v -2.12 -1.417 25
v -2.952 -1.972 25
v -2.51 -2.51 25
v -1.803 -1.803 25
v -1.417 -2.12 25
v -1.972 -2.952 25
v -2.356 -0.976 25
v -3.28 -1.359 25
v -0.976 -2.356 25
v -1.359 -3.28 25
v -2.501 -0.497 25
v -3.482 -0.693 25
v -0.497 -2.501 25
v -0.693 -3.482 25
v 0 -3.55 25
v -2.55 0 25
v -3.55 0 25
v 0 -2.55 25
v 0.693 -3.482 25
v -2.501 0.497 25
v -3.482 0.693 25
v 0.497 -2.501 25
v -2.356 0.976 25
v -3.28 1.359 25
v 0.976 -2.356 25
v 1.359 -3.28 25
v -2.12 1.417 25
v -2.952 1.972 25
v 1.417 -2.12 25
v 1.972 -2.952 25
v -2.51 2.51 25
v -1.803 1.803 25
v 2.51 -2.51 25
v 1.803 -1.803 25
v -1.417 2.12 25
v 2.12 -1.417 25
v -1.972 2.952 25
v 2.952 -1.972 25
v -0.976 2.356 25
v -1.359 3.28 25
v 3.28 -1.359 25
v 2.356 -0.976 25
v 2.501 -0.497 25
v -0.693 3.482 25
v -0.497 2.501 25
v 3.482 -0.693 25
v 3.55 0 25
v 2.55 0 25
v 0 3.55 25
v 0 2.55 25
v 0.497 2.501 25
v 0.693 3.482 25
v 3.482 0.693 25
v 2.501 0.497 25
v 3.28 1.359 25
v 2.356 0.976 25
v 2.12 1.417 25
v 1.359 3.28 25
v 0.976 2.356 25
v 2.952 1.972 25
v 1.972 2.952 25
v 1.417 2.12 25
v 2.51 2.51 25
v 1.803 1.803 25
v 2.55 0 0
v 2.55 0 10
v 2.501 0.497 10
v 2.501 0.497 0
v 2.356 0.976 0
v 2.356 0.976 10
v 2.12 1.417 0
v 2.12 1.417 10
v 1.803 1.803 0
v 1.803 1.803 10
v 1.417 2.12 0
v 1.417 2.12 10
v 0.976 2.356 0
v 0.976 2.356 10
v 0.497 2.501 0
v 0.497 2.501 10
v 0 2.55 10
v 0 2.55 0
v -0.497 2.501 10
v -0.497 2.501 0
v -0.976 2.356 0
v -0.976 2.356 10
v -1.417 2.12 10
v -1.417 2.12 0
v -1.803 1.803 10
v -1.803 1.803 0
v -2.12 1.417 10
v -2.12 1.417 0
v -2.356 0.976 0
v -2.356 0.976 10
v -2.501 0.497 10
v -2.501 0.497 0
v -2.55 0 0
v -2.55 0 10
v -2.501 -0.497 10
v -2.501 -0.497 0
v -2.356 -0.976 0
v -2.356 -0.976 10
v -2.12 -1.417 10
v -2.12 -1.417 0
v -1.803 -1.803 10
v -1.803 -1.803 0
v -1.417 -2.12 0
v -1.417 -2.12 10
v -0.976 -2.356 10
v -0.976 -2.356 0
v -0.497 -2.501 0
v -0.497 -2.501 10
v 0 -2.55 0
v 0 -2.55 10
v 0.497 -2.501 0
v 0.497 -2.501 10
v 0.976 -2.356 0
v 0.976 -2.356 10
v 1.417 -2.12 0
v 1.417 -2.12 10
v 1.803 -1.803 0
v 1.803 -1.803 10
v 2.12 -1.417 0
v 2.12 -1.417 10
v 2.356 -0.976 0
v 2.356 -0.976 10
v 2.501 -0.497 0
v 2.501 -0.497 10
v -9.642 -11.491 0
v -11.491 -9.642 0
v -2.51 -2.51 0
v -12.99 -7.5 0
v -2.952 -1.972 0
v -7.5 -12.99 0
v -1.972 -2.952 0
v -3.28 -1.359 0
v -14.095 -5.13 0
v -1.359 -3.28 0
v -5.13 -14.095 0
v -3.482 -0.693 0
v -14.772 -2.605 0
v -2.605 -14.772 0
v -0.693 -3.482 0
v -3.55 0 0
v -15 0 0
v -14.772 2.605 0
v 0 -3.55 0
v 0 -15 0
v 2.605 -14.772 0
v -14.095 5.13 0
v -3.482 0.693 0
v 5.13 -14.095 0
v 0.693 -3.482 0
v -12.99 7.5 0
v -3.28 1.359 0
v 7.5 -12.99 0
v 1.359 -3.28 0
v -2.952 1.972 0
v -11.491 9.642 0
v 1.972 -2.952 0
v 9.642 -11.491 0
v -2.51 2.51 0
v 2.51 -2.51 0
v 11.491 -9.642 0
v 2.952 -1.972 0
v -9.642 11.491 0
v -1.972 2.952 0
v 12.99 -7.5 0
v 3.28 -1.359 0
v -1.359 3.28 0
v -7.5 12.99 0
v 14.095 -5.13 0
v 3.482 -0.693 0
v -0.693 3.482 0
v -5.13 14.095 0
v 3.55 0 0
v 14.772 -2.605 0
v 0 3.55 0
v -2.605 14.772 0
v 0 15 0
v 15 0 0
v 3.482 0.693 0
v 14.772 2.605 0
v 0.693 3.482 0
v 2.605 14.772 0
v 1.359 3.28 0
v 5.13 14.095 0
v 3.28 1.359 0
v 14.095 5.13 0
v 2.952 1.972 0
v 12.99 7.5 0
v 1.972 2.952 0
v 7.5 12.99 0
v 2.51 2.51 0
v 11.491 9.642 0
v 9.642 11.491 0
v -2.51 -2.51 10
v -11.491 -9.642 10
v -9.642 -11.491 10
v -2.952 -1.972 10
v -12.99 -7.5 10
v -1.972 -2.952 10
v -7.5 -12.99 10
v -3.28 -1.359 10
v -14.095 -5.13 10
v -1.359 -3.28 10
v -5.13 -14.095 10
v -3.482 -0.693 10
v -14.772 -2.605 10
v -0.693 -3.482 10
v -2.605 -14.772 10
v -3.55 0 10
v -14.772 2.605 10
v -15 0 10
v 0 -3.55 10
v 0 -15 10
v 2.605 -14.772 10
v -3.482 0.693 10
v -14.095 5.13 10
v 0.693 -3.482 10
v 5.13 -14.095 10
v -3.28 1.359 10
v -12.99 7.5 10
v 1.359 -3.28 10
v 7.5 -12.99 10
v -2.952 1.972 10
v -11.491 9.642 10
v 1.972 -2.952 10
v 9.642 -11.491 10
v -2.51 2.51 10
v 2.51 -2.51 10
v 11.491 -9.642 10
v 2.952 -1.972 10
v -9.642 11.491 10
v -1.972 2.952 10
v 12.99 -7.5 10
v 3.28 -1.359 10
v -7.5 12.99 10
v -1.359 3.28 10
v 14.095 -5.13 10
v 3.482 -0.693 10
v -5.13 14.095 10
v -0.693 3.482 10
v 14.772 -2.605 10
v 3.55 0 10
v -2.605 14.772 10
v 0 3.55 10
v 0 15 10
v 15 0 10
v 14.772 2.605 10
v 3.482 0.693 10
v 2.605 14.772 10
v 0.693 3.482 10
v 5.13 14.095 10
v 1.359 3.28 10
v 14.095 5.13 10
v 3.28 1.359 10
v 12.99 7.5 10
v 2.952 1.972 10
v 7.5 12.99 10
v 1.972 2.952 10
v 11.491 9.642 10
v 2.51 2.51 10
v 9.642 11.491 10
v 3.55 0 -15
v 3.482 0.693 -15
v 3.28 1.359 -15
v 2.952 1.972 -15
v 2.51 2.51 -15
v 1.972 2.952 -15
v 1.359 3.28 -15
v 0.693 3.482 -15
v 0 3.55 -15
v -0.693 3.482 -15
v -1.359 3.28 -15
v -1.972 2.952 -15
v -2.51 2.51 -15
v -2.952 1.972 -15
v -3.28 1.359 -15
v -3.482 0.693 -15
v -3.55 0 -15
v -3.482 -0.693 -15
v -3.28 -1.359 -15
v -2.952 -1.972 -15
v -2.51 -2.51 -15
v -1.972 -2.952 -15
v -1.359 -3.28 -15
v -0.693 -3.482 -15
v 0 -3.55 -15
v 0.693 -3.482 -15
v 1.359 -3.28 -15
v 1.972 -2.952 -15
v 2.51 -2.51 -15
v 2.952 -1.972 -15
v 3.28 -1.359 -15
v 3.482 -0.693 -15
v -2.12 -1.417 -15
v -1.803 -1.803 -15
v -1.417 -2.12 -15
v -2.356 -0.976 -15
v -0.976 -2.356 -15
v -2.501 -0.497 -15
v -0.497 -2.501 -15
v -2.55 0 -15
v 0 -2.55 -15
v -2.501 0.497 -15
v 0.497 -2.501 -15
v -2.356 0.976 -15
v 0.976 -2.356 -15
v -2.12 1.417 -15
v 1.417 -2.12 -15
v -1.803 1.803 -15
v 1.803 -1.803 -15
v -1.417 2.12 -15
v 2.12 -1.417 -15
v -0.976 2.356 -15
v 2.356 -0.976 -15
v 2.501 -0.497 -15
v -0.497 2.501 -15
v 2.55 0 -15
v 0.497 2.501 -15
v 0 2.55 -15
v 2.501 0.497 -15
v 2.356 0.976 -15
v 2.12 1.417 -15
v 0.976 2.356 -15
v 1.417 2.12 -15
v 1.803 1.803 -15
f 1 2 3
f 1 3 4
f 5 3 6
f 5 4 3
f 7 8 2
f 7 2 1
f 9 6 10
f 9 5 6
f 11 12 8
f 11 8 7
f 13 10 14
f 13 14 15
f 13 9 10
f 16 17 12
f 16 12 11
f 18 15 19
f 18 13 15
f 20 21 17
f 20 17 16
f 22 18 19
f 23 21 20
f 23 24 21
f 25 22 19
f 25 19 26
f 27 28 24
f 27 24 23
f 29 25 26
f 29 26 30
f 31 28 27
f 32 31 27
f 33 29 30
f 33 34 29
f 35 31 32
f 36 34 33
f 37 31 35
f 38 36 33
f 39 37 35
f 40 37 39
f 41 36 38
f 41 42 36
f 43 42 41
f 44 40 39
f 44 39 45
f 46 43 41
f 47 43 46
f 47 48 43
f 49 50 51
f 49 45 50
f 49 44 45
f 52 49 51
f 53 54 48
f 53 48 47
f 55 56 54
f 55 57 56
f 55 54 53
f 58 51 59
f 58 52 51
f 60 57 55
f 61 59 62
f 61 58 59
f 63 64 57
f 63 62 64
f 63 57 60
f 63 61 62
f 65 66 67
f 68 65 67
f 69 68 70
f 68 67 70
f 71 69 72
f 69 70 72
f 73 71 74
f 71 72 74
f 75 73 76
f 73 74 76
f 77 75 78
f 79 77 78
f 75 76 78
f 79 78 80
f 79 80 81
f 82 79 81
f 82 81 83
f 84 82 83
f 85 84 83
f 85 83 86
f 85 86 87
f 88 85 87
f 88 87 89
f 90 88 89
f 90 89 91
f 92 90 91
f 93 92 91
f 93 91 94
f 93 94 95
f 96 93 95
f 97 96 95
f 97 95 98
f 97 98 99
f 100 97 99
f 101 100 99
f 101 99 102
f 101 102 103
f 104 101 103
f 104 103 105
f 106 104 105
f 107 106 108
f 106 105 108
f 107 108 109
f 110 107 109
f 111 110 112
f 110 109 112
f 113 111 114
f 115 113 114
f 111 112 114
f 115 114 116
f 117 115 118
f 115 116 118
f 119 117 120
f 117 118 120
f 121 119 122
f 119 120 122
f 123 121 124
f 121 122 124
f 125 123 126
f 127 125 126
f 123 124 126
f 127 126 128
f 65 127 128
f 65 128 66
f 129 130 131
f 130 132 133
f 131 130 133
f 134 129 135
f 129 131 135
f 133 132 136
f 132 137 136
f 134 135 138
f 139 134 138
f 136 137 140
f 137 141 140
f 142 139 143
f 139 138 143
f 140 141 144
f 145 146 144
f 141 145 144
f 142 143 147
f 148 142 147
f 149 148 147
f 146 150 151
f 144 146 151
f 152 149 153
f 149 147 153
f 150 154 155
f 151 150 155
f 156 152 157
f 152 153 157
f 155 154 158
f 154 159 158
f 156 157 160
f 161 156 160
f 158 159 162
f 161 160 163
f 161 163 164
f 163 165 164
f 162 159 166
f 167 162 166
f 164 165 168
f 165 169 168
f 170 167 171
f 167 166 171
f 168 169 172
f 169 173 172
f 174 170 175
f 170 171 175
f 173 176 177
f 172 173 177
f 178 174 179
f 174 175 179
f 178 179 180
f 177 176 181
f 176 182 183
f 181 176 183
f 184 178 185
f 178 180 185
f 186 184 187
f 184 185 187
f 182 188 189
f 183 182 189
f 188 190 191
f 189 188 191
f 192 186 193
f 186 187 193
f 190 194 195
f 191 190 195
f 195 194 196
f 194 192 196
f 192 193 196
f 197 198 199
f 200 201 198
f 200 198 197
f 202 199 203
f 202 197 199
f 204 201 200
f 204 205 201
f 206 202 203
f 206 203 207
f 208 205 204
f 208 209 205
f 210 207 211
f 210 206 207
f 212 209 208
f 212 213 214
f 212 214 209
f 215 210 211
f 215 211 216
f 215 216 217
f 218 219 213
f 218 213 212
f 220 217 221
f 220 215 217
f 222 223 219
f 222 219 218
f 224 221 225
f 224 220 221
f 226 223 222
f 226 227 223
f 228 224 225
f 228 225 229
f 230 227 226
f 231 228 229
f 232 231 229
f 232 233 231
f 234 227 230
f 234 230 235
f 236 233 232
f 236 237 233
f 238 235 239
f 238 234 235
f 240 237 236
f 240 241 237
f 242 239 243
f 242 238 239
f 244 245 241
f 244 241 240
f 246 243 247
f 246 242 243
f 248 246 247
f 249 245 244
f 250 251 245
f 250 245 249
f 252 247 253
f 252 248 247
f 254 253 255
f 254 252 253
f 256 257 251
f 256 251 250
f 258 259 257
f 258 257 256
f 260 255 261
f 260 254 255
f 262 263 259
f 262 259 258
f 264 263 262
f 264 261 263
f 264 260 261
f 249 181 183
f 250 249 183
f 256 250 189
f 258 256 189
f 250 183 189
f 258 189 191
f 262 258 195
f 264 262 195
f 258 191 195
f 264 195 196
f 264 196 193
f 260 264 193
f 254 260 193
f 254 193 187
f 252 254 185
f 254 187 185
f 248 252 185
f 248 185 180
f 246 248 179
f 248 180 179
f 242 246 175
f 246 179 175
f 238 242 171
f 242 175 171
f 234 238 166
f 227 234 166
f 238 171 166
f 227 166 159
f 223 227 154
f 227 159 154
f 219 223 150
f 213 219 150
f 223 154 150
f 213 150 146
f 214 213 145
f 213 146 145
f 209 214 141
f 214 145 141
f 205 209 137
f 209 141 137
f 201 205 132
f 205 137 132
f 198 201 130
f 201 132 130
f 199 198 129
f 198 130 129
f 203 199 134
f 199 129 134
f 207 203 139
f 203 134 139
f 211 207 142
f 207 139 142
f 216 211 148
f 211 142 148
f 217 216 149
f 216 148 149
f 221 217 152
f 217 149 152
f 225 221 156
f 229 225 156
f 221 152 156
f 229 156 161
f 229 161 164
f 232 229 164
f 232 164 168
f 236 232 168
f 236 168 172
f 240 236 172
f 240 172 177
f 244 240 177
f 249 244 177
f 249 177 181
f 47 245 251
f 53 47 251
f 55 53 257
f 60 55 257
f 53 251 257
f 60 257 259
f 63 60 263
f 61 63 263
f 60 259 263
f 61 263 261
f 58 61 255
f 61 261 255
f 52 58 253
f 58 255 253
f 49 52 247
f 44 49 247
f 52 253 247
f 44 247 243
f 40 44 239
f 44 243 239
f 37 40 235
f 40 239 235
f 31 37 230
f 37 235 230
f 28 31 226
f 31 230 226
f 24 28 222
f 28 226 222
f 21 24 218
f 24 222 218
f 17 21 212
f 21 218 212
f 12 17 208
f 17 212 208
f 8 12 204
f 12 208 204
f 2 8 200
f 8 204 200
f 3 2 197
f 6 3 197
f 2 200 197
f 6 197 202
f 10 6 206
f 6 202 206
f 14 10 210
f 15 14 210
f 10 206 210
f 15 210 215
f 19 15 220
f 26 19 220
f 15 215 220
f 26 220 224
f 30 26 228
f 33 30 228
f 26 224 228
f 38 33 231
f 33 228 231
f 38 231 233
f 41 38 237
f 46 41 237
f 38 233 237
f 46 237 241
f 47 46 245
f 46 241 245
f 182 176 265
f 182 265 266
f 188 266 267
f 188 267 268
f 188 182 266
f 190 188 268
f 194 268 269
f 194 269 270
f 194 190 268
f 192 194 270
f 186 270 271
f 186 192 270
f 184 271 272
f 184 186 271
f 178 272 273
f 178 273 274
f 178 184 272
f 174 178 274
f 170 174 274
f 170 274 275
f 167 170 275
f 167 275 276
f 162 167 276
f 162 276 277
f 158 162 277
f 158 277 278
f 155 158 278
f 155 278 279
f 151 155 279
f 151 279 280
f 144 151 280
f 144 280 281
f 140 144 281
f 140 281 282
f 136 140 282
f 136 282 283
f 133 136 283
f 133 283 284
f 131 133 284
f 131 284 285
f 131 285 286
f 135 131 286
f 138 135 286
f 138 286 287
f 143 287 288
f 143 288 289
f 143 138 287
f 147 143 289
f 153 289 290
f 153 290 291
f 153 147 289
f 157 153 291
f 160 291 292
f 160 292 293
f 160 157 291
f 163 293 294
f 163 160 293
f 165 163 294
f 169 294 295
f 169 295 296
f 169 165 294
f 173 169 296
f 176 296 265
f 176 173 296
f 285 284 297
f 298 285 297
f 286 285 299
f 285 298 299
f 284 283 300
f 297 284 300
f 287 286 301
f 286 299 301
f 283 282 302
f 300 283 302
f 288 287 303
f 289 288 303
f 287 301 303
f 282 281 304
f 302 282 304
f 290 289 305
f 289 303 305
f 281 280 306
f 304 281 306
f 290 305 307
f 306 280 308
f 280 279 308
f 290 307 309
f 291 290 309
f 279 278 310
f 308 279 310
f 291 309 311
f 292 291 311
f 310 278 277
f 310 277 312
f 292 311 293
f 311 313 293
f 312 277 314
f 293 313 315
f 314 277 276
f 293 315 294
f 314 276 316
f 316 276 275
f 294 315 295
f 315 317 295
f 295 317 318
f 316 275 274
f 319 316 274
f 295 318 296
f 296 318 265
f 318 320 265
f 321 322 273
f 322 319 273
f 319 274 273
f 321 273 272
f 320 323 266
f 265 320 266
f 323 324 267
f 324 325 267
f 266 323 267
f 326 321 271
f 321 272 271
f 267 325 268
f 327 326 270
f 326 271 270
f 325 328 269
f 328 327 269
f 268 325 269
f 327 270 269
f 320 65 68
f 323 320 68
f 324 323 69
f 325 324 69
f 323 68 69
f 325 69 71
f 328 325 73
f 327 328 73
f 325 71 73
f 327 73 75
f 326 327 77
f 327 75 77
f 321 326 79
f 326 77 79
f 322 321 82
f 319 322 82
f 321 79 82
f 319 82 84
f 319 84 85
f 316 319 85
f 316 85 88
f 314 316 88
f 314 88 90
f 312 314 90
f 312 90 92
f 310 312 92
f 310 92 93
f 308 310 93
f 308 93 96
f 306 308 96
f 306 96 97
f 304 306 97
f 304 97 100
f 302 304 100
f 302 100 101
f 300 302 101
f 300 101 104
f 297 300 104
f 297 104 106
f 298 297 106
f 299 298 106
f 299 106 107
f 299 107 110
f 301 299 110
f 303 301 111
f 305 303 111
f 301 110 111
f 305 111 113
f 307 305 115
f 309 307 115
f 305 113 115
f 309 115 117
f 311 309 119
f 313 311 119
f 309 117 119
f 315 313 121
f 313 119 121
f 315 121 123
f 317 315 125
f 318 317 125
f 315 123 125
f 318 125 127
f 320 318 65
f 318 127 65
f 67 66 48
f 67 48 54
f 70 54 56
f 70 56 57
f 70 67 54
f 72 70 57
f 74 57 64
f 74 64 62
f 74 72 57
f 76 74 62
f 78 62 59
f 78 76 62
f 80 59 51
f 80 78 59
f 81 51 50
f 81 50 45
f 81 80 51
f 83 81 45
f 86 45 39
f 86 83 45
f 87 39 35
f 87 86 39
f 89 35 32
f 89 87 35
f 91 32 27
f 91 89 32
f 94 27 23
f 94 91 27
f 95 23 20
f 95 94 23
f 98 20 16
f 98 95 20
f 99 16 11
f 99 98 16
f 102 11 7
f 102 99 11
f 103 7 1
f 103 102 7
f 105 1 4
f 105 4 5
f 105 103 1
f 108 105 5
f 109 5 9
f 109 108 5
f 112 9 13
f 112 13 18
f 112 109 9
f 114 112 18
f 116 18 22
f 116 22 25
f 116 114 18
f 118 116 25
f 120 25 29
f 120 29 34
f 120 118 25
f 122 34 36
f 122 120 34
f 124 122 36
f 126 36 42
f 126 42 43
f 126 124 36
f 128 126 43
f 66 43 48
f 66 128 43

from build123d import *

# Parameters (mm, degrees)
SKETCH3_R                = 15
BOSS_EXTRUDE1_DEPTH      = 10
SKETCH4_R                = 3.55
SKETCH4_R_2              = 2.55
BOSS_EXTRUDE2_DEPTH      = 15
BOSS_EXTRUDE2_DEPTH_BACK = 25
SKETCH9_R                = 2.55
CUT_EXTRUDE1_DEPTH       = 26


with BuildPart() as part:
    # Sketch3 → Boss-Extrude1 (new body)
    with BuildSketch(Plane.XY):
        Circle(SKETCH3_R)
    extrude(amount=BOSS_EXTRUDE1_DEPTH)

    # Sketch4 → Boss-Extrude2 (add, two sides)
    with BuildSketch(Plane.XY.offset(10)) as boss_extrude2_sk:
        Circle(SKETCH4_R)
        Circle(SKETCH4_R_2, mode=Mode.SUBTRACT)
    extrude(amount=BOSS_EXTRUDE2_DEPTH)
    extrude(boss_extrude2_sk.sketch, amount=-BOSS_EXTRUDE2_DEPTH_BACK)

    # Sketch9 → Cut-Extrude1 (cut, through all)
    with BuildSketch(Plane.XY.offset(10)):
        Circle(SKETCH9_R)
    extrude(amount=-CUT_EXTRUDE1_DEPTH, mode=Mode.SUBTRACT)


solid = part.part
